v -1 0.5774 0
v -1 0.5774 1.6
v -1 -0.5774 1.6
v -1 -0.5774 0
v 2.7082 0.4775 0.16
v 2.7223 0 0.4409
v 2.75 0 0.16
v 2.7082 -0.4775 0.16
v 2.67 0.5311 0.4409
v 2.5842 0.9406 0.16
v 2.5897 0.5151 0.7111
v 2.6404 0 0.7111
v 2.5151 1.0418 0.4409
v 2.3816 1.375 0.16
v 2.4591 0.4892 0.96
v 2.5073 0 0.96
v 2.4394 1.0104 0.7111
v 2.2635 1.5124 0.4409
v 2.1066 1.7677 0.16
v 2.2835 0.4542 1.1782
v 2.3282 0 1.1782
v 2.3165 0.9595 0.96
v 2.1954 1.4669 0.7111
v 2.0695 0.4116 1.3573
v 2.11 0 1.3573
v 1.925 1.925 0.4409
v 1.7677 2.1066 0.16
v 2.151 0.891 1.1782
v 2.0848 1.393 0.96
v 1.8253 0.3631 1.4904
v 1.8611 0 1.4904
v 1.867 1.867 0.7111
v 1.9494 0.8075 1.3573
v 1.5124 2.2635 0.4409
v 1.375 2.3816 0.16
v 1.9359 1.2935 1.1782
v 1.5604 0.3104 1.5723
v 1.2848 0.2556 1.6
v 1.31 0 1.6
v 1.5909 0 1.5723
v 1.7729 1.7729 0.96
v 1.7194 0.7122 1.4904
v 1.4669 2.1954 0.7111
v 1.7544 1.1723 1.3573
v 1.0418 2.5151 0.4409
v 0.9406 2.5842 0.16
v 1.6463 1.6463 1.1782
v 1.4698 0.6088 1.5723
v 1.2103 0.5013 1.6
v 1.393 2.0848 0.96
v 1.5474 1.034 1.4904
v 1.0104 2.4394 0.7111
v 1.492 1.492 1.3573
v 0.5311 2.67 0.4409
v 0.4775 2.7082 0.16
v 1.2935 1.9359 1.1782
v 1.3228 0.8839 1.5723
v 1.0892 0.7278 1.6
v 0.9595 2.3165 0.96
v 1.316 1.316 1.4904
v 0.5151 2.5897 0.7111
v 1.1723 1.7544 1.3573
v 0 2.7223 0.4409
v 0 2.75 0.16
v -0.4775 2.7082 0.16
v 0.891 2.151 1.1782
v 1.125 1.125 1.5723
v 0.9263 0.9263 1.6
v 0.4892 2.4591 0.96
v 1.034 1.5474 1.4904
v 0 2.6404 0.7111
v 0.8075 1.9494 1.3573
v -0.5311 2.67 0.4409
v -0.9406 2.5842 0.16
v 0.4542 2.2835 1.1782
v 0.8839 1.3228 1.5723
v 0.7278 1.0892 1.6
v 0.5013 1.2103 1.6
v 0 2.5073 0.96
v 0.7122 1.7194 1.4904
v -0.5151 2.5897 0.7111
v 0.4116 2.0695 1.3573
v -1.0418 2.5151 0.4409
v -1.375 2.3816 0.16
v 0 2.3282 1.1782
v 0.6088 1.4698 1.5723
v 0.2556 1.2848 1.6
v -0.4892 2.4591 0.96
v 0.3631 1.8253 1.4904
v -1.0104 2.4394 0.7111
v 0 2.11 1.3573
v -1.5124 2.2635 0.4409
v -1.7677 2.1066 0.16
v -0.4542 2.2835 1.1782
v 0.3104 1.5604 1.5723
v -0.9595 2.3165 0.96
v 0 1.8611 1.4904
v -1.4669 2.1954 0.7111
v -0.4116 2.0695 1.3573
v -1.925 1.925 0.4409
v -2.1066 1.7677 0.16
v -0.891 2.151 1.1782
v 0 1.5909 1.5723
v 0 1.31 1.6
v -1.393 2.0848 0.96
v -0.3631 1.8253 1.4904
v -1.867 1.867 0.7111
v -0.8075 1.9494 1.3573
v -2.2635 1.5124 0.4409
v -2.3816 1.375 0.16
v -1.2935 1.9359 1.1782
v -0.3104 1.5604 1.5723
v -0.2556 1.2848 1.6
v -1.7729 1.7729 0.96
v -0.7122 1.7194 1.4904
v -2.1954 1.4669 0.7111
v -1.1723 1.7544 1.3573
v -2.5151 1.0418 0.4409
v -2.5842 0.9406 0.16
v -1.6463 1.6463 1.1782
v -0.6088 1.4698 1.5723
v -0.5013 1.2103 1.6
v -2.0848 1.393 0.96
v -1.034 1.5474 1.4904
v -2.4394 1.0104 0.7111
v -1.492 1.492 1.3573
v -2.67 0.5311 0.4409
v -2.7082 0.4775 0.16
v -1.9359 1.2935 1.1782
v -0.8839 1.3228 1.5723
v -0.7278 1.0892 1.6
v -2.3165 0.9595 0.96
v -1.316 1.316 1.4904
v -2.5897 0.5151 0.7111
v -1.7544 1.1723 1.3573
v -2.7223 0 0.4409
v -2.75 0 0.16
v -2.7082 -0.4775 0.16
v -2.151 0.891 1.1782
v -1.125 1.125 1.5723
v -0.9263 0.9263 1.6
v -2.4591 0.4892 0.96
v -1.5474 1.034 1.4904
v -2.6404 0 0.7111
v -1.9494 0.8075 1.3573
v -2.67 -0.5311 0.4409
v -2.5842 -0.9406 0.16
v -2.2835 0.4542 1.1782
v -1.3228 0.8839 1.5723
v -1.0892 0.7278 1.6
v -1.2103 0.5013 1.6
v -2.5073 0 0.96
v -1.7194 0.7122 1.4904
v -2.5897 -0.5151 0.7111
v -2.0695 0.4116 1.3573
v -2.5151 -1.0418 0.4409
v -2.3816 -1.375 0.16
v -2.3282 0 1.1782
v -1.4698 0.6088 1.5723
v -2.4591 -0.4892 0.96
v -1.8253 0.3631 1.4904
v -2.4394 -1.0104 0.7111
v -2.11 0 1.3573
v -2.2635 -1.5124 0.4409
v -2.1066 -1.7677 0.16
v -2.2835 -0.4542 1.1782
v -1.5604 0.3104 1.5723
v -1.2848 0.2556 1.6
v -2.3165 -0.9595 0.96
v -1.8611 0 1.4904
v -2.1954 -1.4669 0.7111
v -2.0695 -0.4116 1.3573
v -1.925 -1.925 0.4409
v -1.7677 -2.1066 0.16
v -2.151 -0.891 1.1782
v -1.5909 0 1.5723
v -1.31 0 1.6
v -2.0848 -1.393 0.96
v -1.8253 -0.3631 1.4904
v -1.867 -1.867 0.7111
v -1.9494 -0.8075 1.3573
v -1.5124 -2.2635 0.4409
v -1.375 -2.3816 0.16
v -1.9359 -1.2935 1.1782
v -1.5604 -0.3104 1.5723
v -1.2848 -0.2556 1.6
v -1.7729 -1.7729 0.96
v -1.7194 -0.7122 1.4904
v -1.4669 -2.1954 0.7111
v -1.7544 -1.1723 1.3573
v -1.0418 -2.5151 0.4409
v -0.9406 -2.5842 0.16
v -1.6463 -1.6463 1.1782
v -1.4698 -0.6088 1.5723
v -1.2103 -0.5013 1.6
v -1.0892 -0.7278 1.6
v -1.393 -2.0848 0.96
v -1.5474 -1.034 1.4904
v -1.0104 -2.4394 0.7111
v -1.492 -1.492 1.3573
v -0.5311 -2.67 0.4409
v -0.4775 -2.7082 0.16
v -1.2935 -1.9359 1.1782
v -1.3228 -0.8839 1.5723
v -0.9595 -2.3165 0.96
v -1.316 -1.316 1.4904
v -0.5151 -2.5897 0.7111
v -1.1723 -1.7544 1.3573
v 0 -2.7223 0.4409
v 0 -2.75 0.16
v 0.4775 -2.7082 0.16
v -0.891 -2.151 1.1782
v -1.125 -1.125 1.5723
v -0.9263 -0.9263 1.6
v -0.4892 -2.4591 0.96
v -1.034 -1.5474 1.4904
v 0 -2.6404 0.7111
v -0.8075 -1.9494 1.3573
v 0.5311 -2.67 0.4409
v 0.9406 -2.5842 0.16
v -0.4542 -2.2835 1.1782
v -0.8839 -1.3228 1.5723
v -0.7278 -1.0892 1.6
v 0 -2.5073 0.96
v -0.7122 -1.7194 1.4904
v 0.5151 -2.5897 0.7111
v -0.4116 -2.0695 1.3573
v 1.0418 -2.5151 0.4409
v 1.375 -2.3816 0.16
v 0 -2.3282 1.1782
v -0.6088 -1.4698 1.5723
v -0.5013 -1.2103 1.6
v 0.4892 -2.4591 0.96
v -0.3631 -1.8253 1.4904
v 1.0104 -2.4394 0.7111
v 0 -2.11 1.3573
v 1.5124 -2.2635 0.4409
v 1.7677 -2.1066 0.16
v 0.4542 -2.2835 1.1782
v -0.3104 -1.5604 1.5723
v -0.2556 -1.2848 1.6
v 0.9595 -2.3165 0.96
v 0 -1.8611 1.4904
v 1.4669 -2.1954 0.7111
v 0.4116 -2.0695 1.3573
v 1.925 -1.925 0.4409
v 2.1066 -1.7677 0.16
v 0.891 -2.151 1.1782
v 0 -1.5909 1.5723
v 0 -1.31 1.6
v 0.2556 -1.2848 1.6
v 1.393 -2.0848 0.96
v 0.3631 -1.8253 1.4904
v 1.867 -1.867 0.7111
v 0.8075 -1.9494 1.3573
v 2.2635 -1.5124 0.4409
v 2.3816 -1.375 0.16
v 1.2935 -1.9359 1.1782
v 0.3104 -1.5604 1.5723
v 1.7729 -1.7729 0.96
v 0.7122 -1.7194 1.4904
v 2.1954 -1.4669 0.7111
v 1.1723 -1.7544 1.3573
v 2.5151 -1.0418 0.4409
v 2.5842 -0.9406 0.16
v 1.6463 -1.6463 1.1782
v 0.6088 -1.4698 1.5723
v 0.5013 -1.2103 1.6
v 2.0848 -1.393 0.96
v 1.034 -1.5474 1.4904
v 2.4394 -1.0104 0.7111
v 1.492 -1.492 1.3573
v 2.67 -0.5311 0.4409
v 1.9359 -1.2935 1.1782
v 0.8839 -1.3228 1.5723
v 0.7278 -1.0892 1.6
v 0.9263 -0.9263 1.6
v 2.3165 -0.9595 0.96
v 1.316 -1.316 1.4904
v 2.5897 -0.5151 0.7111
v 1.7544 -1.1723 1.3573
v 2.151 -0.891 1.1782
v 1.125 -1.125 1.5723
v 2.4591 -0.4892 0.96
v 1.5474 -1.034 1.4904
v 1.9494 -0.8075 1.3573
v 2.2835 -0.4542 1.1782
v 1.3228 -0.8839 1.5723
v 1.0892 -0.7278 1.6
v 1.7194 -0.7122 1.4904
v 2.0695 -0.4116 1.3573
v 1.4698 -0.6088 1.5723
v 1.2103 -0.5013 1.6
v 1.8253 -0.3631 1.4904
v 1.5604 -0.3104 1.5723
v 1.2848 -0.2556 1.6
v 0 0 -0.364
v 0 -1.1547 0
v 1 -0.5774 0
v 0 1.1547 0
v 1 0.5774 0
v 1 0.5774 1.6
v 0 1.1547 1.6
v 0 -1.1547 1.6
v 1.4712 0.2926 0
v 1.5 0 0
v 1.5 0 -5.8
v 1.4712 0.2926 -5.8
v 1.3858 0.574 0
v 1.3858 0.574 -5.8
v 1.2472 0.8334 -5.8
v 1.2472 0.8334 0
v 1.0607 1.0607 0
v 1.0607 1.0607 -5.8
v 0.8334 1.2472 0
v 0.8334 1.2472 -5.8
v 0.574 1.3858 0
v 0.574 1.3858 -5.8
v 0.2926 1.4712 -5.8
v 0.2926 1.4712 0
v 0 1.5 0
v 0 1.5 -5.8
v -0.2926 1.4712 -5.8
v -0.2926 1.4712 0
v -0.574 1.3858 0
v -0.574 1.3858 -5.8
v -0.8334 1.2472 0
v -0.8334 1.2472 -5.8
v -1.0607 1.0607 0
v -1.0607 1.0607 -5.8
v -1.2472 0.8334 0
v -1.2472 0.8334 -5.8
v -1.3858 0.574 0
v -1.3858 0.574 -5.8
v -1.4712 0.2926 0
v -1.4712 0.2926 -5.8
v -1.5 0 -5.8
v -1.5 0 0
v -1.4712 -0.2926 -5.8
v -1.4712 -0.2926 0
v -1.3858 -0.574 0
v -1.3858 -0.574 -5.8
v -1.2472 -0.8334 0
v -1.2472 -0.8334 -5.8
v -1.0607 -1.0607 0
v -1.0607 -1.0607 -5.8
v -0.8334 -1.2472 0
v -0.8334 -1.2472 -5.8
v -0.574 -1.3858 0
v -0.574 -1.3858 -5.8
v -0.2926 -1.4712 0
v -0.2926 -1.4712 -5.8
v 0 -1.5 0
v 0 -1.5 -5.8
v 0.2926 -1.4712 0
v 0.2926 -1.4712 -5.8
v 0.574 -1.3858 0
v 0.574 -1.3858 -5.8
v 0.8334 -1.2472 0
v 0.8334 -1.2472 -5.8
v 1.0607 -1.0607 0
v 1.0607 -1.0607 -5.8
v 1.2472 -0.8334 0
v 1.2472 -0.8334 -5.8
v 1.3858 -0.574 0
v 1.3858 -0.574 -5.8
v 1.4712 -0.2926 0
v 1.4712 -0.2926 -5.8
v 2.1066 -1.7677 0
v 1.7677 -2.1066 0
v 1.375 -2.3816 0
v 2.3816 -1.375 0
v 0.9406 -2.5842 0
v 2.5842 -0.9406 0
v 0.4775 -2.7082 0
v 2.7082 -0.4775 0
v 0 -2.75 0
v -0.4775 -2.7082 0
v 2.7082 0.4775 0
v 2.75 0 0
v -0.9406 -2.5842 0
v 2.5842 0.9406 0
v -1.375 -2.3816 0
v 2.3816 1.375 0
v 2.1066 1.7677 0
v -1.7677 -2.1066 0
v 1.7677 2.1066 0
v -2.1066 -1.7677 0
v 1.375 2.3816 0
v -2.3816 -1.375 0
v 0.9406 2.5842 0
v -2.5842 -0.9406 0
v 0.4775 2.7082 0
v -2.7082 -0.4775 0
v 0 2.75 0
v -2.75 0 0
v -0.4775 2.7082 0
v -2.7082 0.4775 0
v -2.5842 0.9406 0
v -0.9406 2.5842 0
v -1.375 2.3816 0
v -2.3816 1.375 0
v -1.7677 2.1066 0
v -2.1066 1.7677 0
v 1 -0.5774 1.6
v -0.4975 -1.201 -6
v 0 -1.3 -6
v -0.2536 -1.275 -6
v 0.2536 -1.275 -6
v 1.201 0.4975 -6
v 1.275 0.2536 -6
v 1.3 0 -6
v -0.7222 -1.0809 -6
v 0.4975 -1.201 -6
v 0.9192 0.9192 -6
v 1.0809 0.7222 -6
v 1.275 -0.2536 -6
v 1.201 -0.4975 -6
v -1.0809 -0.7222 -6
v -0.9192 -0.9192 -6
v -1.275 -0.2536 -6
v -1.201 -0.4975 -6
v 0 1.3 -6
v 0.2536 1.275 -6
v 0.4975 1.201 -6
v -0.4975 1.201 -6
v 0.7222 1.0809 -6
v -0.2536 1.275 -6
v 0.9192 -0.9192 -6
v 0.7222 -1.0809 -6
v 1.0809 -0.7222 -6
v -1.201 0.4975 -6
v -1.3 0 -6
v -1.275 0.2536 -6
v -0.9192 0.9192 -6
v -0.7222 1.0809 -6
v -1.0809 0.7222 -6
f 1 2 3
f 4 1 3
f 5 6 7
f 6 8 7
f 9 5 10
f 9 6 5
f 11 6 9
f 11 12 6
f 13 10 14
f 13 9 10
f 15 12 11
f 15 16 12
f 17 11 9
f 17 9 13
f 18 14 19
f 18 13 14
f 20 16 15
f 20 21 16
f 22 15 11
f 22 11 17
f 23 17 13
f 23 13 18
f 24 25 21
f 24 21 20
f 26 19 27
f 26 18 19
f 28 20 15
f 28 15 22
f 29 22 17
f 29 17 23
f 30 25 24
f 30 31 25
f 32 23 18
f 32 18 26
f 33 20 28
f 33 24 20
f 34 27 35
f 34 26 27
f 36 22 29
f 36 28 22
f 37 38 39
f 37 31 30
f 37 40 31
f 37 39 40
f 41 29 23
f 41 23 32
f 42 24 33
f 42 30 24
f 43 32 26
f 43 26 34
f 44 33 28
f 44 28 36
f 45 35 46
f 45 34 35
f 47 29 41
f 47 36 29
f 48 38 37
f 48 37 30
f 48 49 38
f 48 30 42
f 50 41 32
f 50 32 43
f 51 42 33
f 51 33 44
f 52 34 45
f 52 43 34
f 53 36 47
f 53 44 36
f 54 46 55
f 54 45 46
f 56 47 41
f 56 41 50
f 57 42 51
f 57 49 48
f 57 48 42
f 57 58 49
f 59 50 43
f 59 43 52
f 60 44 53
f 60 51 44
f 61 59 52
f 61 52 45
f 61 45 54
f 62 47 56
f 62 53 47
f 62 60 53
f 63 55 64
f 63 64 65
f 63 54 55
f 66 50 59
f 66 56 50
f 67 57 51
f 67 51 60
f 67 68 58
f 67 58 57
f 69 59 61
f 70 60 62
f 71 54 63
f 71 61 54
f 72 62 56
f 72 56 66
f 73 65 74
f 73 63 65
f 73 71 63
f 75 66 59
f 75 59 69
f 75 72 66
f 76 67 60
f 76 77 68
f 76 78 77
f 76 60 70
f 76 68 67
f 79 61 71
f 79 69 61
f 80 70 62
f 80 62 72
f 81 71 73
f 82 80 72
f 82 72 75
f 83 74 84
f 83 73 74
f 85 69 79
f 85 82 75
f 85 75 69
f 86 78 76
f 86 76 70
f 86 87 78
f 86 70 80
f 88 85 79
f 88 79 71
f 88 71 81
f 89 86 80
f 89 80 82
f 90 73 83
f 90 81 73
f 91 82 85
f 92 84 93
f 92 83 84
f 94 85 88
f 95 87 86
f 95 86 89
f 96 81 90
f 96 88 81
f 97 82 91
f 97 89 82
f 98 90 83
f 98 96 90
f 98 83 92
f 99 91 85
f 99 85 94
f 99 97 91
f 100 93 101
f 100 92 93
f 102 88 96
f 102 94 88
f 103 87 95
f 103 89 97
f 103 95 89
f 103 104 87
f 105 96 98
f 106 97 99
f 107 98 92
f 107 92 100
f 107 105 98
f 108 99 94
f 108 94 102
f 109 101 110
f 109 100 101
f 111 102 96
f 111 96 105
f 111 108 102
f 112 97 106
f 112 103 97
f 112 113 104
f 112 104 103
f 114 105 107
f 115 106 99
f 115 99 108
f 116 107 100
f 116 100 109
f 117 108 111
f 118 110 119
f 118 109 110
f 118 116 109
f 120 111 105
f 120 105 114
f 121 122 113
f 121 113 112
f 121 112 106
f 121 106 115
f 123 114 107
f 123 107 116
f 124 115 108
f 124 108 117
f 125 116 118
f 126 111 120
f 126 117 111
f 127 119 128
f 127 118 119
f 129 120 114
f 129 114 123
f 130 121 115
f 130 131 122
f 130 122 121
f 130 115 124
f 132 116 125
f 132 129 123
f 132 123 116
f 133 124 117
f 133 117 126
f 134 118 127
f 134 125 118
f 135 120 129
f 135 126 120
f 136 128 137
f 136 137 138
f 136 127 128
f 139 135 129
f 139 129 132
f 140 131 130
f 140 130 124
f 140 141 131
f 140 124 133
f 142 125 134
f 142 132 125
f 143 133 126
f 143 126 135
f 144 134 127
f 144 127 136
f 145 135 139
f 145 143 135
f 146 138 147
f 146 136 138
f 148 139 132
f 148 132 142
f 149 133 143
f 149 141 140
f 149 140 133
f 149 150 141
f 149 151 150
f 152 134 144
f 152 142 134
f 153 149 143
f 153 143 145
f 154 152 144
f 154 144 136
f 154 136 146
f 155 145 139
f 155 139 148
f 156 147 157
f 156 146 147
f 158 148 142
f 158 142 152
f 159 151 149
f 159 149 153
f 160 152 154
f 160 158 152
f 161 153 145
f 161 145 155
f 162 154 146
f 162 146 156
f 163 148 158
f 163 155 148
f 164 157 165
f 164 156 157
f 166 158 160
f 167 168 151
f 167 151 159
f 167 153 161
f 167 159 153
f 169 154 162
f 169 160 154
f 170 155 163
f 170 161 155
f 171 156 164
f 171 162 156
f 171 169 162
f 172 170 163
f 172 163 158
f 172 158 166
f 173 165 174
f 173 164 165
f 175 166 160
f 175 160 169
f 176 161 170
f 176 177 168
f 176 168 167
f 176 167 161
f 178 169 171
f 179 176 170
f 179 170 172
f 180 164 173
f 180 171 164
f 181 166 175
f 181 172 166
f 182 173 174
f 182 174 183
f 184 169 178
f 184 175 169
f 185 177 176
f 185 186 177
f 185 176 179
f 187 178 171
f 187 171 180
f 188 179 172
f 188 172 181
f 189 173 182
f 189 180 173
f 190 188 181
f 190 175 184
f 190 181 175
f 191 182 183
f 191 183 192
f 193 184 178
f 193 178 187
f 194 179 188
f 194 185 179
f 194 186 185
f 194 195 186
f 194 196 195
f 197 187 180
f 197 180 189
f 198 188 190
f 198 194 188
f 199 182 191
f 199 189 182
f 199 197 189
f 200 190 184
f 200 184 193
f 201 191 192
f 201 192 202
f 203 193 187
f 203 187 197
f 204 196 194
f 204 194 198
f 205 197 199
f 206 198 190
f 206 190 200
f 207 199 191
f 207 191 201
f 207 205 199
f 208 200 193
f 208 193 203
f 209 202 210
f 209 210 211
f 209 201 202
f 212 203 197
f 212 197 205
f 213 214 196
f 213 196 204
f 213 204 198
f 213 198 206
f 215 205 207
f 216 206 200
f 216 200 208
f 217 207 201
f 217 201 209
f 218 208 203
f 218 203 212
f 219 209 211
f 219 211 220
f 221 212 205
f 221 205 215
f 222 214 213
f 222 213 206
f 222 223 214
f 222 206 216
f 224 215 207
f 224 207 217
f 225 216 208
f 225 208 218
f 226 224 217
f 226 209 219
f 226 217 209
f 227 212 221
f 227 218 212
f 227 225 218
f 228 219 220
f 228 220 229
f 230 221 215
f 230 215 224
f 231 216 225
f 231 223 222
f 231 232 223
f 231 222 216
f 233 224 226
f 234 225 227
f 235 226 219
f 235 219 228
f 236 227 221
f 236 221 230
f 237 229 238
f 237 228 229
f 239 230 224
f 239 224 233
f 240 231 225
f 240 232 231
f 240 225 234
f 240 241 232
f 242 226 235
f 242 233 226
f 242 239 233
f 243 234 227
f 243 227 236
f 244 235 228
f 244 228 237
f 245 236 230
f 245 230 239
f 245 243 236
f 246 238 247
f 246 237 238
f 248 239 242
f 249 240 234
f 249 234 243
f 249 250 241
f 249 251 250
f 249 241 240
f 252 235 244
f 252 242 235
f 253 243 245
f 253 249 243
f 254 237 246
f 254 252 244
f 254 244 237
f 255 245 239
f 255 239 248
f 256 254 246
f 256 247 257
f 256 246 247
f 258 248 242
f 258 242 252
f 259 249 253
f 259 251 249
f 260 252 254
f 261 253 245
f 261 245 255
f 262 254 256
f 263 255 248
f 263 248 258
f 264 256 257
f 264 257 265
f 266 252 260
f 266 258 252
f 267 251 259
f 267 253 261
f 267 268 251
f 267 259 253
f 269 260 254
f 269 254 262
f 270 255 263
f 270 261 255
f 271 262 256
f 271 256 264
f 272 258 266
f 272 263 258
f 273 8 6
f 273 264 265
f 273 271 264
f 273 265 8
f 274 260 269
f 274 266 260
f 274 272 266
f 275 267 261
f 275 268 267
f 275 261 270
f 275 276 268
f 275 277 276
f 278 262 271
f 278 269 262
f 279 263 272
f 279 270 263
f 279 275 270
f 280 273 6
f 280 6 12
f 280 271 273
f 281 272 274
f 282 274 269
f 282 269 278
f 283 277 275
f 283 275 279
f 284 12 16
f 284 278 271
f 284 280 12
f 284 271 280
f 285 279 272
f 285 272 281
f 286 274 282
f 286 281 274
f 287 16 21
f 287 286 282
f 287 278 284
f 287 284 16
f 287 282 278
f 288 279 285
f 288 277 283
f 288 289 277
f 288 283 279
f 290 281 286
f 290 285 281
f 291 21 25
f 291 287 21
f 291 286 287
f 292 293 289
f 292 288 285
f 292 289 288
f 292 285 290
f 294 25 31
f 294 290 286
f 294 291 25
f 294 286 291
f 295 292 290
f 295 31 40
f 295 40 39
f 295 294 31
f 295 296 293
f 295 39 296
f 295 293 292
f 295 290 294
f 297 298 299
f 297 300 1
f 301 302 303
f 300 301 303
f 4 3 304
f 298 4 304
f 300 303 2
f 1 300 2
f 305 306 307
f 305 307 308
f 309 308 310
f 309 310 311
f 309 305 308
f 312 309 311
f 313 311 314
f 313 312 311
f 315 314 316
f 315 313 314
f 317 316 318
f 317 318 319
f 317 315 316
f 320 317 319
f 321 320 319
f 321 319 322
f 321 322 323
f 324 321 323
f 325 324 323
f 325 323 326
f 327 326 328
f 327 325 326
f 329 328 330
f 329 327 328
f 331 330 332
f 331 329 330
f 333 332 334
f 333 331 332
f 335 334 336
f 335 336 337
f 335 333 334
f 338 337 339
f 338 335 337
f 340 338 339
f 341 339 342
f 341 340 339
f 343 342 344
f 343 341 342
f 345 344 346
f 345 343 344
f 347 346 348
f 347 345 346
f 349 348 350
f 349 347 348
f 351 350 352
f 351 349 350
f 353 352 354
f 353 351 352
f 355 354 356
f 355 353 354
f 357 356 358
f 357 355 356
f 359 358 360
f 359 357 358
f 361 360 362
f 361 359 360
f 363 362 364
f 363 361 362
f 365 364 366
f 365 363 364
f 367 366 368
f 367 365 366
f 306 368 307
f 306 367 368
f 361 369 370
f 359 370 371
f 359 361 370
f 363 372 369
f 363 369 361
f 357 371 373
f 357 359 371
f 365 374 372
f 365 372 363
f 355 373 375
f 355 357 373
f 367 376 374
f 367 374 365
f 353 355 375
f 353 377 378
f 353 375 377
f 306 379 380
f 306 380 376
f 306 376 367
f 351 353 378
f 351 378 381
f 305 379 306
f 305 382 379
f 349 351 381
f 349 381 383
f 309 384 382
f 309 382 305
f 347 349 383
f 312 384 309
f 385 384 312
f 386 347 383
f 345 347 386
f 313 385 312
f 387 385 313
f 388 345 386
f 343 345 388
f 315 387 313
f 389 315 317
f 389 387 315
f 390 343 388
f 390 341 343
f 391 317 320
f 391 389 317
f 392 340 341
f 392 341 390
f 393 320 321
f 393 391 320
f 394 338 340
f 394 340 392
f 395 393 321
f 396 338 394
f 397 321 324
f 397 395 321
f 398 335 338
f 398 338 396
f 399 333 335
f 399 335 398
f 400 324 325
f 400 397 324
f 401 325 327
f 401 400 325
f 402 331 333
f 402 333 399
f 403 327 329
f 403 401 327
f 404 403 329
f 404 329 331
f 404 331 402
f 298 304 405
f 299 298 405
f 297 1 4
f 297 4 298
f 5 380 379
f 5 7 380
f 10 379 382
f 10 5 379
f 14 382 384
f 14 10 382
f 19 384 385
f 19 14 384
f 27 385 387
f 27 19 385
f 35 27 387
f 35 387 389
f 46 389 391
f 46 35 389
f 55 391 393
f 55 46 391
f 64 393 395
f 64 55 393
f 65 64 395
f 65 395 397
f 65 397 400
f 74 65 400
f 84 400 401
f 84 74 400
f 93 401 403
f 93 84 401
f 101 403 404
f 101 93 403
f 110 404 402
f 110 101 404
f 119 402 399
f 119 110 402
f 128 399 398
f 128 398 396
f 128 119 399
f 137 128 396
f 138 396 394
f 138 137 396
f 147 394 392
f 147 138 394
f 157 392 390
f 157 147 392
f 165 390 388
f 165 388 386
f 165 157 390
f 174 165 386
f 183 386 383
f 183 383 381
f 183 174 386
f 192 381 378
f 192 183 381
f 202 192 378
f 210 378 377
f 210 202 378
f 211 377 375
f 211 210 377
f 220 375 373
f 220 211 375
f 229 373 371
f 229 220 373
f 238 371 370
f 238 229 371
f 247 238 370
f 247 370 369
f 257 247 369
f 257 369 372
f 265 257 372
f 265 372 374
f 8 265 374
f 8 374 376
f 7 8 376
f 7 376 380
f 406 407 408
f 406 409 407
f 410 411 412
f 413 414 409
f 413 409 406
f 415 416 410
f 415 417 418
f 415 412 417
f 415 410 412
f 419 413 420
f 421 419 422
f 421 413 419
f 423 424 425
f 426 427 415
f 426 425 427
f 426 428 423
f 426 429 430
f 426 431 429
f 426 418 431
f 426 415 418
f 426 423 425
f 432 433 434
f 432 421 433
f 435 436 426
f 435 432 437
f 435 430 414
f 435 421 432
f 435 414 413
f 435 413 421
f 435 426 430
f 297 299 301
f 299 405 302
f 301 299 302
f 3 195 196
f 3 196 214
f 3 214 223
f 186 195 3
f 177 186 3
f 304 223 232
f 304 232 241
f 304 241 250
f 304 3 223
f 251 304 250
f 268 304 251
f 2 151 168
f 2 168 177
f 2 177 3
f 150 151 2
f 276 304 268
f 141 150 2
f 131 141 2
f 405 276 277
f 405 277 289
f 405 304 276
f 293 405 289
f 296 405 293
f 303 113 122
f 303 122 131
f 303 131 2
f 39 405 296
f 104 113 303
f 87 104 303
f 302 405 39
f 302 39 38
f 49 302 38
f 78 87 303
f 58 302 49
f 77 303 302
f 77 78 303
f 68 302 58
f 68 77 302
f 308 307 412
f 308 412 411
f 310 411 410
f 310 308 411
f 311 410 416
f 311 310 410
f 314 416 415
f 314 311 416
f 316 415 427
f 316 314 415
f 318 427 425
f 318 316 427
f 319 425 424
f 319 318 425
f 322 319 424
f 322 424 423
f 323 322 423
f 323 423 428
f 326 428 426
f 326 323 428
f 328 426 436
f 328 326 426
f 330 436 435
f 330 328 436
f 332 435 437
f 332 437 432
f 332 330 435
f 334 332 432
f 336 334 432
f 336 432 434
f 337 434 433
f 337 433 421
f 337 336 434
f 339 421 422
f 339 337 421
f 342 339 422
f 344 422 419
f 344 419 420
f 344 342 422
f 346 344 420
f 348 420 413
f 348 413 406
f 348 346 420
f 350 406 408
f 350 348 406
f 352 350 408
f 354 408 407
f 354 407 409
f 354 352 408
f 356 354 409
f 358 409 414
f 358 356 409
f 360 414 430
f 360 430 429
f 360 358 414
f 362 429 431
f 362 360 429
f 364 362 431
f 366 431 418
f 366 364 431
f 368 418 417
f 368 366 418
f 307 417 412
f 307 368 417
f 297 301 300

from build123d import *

# Parameters (mm, degrees)
F3_DEPTH = 1.6
F6_SIZE  = 0.2


# Not quite as in the source:
# - an extrude whose draft closes it to a point is written as a loft to that point


with BuildPart() as f1:
    # F0 (on Front) → F1 (revolve)
    with BuildSketch(Plane.XZ):
        with BuildLine():
            Line((0, 1.6), (0, -6))
            Line((0, -6), (1.5, -6))
            Line((1.5, -6), (1.5, 0))
            Line((1.5, 0), (2.75, 0))
            Line((2.75, 0), (2.75, 0.16))
            ThreePointArc((2.75, 0.16), (2.3282337649, 1.1782337649), (1.31, 1.6))
            Line((1.31, 1.6), (0, 1.6))
        make_face()
    revolve(axis=Axis((0, 0, 3.7619129732), (0, 0, 1)))

    # F2 (on face) → F3 (cut)
    with BuildSketch(Plane.XY.offset(1.6)):
        Polygon((-1, 0.5773502692), (-1, -0.5773502692), (0, -1.1547005384), (1, -0.5773502692), (1, 0.5773502692), (0, 1.1547005384), align=None)
    extrude(amount=-F3_DEPTH, mode=Mode.SUBTRACT)

    # F4 (on face) → F5 section 0
    with BuildSketch(Plane.XY, mode=Mode.PRIVATE) as f5_s0:
        Polygon((-1, 0.5773502692), (-1, -0.5773502692), (0, -1.1547005384), (1, -0.5773502692), (1, 0.5773502692), (0, 1.1547005384), align=None)
    loft([f5_s0.sketch, Vertex(0, 0, -0.3639702343)], ruled=True, mode=Mode.SUBTRACT)

    # F6
    f6_edges = [f1.edges().sort_by_distance(p)[0] for p in [
        (-1.5, 0, -6),
    ]]
    chamfer(f6_edges, length=F6_SIZE)


solid = f1.part
